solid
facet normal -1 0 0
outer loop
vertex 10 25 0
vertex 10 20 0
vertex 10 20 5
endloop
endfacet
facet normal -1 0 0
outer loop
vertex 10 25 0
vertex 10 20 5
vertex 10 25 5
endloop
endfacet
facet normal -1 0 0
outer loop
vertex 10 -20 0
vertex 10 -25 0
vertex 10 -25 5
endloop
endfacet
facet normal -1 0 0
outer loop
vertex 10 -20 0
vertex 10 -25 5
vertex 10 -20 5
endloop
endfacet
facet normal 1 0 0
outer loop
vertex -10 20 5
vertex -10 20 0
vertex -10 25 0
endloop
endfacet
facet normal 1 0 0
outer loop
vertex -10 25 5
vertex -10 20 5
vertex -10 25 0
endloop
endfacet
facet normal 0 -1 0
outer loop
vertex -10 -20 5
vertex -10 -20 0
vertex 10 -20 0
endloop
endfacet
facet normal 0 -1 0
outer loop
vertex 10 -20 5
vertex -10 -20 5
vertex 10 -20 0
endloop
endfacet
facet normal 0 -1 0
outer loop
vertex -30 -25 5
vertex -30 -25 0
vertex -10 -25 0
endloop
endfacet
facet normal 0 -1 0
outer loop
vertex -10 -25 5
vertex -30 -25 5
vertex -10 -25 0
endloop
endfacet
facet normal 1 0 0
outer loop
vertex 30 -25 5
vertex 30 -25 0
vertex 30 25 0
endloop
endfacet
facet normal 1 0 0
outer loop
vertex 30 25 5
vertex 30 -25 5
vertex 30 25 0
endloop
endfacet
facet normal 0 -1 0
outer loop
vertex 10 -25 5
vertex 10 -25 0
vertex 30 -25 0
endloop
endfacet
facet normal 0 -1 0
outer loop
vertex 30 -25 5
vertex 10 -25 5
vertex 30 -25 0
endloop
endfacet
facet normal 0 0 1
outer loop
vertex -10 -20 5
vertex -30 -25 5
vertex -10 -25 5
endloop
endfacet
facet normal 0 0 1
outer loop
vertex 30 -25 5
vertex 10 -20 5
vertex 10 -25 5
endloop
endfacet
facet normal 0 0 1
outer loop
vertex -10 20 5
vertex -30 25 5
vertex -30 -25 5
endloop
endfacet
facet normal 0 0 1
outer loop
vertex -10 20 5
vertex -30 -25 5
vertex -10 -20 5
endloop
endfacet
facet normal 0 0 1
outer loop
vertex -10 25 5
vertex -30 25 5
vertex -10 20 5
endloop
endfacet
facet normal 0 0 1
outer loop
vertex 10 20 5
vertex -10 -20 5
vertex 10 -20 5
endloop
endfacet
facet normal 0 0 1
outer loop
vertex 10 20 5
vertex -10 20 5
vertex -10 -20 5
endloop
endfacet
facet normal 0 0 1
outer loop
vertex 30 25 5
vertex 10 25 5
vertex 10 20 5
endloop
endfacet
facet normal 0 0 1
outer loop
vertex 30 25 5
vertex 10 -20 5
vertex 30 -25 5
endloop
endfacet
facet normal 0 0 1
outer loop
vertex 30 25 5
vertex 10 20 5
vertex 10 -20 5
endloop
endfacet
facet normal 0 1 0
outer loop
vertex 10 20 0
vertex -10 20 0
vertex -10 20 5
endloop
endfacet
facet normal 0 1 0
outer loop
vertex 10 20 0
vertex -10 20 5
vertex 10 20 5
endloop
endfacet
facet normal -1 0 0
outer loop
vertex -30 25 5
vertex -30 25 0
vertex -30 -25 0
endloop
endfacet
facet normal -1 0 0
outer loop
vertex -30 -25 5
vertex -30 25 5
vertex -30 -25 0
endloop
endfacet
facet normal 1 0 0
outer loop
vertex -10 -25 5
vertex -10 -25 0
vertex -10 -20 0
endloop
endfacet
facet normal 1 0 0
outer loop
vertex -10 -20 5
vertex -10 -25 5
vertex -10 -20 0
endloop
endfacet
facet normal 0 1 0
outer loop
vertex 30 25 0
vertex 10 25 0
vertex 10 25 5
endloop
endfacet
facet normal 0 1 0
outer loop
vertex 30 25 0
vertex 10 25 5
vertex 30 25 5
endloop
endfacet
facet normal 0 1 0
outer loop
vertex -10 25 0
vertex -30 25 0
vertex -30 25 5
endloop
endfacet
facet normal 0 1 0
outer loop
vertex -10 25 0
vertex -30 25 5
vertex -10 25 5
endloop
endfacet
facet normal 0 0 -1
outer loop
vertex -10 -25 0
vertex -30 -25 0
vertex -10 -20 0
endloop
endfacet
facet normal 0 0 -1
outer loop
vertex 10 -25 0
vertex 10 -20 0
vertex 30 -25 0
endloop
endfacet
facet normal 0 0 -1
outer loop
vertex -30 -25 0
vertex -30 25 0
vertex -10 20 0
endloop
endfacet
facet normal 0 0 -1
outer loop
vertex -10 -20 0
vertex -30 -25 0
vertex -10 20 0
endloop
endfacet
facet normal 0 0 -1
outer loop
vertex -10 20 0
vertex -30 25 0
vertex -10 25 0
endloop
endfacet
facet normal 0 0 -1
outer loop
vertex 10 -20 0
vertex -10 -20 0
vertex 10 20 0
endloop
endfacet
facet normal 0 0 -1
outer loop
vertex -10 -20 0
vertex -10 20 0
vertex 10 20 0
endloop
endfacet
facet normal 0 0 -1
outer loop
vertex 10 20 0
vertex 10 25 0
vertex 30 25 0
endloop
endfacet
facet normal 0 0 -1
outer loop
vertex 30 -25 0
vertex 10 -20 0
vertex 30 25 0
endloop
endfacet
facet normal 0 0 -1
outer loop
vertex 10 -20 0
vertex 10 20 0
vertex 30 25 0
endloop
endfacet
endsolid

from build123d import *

# Parameters (mm, degrees)
SKETCH1_W           = 60
SKETCH1_H           = 40
SKETCH1_W_2         = 20
SKETCH1_H_2         = 5
BOSS_EXTRUDE1_DEPTH = 5


with BuildPart() as part:
    # Sketch1 → Boss-Extrude1 (new body)
    with BuildSketch(Plane.XY):
        Rectangle(SKETCH1_W, SKETCH1_H)
        with Locations((-20, 22.5)):
            Rectangle(SKETCH1_W_2, SKETCH1_H_2)
        with Locations((20, -22.5)):
            Rectangle(SKETCH1_W_2, SKETCH1_H_2)
        with Locations((-20, -22.5)):
            Rectangle(SKETCH1_W_2, SKETCH1_H_2)
        with Locations((20, 22.5)):
            Rectangle(SKETCH1_W_2, SKETCH1_H_2)
    extrude(amount=BOSS_EXTRUDE1_DEPTH)


solid = part.part
